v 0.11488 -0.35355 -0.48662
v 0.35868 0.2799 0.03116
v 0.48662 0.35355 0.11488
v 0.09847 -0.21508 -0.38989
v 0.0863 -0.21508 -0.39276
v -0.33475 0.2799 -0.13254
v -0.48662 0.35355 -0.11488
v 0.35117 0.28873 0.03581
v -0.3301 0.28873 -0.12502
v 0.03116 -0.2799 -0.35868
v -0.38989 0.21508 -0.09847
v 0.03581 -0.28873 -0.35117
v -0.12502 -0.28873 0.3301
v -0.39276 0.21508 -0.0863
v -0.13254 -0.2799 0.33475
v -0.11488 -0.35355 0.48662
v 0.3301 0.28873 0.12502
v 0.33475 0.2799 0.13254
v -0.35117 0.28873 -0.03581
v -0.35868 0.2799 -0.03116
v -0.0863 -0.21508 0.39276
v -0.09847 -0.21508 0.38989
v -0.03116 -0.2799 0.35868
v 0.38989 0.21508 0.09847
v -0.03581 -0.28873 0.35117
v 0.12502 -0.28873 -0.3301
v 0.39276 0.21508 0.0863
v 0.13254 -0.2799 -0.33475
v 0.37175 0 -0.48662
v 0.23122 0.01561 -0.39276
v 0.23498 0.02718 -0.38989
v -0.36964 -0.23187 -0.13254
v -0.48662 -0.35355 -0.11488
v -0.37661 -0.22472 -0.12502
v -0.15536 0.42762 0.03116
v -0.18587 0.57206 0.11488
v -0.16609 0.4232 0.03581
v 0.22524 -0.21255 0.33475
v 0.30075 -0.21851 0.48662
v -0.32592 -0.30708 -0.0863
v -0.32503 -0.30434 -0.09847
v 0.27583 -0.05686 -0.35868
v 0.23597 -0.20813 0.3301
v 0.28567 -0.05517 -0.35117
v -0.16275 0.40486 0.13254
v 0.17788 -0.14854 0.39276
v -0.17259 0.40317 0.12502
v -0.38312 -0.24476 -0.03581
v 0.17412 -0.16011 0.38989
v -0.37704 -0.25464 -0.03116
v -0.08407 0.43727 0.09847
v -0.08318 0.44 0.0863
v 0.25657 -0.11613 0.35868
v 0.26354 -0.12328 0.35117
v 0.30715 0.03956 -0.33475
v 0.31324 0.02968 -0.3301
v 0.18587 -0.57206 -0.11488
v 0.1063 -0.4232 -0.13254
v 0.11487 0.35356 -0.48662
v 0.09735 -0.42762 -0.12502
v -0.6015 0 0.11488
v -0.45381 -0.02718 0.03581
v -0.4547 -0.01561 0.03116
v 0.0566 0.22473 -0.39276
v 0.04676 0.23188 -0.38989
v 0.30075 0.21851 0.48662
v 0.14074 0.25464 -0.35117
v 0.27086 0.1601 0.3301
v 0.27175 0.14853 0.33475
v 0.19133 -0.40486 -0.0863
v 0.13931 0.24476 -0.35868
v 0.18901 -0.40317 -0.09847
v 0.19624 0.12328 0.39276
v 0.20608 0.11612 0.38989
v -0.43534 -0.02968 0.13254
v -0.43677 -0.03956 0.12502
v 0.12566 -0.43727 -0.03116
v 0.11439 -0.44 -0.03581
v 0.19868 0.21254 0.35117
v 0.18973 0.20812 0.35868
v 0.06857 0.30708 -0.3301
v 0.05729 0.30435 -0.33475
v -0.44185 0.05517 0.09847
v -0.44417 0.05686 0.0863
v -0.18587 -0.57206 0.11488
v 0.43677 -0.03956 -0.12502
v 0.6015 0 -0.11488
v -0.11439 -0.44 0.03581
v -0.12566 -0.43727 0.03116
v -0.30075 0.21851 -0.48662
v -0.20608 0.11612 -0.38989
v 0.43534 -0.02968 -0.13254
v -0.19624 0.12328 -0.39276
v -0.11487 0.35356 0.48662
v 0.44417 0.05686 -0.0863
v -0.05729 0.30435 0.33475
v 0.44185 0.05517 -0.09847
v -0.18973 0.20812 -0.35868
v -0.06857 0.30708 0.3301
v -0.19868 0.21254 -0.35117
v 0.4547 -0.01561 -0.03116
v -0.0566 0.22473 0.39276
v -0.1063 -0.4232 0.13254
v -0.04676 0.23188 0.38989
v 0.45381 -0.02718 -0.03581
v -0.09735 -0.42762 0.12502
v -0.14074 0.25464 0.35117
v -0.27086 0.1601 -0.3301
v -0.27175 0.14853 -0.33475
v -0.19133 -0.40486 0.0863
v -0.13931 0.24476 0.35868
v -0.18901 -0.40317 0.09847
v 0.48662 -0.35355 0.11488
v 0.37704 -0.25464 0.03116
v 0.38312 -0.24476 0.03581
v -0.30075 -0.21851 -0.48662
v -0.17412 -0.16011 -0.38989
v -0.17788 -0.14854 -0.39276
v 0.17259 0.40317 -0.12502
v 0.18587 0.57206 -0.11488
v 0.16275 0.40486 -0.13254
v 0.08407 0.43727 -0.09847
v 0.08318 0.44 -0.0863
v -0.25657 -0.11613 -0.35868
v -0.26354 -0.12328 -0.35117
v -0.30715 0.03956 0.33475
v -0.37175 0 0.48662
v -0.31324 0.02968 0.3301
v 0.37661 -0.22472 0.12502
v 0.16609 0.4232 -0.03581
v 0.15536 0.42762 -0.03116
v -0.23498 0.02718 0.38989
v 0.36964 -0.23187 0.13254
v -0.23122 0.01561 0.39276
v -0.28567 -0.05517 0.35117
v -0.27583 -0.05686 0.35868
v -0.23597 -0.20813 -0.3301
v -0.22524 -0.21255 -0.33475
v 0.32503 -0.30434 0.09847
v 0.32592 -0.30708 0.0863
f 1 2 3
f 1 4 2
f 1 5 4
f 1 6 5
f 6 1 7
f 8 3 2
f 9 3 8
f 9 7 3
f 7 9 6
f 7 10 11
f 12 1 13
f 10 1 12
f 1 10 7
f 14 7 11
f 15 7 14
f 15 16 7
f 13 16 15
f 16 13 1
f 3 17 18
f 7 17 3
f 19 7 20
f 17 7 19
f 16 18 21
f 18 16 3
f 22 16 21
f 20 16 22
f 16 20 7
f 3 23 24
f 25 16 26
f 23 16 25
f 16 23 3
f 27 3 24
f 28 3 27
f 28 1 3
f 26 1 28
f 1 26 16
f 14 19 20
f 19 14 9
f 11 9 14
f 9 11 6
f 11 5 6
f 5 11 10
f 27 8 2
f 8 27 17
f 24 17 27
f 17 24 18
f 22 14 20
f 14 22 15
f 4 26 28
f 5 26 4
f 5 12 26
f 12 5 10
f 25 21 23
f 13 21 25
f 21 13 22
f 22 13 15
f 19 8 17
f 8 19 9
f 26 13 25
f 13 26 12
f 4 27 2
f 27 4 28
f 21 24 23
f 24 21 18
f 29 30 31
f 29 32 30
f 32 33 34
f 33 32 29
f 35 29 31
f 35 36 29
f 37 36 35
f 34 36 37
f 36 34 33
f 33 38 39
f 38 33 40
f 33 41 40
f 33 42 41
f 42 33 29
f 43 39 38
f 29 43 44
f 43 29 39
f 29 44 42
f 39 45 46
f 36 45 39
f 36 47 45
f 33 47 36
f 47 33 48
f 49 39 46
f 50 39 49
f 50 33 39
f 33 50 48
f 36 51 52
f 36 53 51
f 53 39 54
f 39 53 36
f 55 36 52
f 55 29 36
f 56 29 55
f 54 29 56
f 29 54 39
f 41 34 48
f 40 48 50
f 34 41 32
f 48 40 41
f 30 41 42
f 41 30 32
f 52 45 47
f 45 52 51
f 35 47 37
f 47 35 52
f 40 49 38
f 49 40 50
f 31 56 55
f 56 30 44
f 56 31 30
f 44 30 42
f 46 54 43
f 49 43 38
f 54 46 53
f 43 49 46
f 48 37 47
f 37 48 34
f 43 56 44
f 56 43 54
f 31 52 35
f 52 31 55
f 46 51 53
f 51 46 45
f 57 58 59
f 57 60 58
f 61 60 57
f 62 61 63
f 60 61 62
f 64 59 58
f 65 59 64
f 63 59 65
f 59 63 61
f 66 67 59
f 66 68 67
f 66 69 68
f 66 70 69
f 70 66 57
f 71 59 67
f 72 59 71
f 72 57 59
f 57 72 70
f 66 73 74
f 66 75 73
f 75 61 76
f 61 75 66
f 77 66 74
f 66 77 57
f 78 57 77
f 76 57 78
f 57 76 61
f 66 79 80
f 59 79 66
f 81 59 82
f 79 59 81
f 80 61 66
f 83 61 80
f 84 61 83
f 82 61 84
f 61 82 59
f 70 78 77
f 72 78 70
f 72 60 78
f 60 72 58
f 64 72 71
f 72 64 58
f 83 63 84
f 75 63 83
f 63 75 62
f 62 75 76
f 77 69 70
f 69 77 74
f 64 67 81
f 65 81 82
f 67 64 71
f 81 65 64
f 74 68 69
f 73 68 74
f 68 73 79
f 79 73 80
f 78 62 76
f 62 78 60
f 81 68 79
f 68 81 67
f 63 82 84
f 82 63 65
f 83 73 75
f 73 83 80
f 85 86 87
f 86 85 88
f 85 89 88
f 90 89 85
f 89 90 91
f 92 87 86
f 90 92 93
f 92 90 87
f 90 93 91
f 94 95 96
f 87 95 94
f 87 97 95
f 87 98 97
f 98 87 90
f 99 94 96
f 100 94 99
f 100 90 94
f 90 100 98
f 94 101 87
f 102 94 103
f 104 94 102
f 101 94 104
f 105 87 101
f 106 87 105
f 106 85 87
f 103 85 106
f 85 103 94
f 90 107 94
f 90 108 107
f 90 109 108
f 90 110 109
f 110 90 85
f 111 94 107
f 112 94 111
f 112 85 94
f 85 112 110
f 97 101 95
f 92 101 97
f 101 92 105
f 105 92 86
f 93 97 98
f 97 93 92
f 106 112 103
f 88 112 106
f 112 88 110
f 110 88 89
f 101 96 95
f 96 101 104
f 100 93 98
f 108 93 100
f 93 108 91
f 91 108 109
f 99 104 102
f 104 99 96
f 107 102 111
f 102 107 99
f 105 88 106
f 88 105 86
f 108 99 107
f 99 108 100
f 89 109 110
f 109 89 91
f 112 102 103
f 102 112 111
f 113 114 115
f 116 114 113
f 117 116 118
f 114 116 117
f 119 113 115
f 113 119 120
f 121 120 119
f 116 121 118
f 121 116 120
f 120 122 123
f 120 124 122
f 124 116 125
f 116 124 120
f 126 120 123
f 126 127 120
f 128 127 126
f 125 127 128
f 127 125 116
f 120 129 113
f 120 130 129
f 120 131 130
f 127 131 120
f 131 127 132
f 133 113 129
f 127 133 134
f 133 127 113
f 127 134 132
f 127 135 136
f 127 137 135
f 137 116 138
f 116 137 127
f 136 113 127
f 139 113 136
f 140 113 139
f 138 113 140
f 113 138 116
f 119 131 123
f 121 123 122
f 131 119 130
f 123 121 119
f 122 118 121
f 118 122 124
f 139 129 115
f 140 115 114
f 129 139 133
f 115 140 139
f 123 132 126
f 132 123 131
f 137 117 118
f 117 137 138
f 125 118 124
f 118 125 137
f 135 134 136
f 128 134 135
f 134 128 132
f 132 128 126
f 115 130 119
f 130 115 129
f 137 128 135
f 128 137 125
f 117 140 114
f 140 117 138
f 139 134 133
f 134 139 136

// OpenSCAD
/*
    fit.scad
    FIT: Five Intersecting Tetrahedra
    Copyright © 2025 Forrest O. Interactive
    Licensed under CC BY 4.0 https://creativecommons.org/licenses/by/4.0/
*/

module hollow_poly(shape_vertices, shape_faces, face_shrink=0.8, hole_grow = 1.05) {
    // Function to find center of a face
    function face_center(vertices, face) = 
        let(
            points = [for(i = face) vertices[i]],
            x = [for(p = points) p[0]],
            y = [for(p = points) p[1]],
            z = [for(p = points) p[2]]
        )
        [(x[0] + x[1] + x[2])/len(face), 
         (y[0] + y[1] + y[2])/len(face), 
         (z[0] + z[1] + z[2])/len(face)];
    
    // Function to shrink a face towards its center
    function shrink_face(vertices, face, shrink_factor) = 
        let(
            center = face_center(vertices, face)
        )
        [for(idx = face)
            let(
                point = vertices[idx],
                vector = point - center
            )
            center + vector * shrink_factor
        ];
    
    // Collect all shrunk faces into a single vertex list
    shrunk_vertices = [
        for(face = shape_faces)
        let(shrunk = shrink_face(shape_vertices, face, face_shrink))
        for(v = shrunk) v
    ];
        
    difference () {
        // polyhedron by itself isn't "water-tight" for difference o_O
        hull() {
            polyhedron(points=shape_vertices, faces=shape_faces);
        }
        
        scale(hole_grow)
        hull() {
            polyhedron(
                points=shrunk_vertices,
                faces=[
                    for(i=[0:len(shrunk_vertices)/3-1])
                    [i*3, i*3+1, i*3+2]
                ]
            );
        }
    }
}

// Tetrahedron basic def via https://github.com/benjamin-edward-morgan/openscad-polyhedra
tetrahedron_vertices = [[1,1,1],[1,-1,-1],[-1,1,-1],[-1,-1,1]]/sqrt(8);
tetrahedron_faces = [[0,1,2],[0,2,3],[0,3,1],[1,3,2]];

colors = ["Red", "Blue", "Green", "Yellow", "Purple"];

// The arcsin(1/3) angle properly aligns the tetrahedron with respect to icosahedral symmetry
initial_rot = [0, 31.717, 0]; // arcsin(1/3) ≈ 31.717°

for(i = [0:4]) {
    color(colors[i])
    rotate([0, 0, i * 360/5])
    rotate(initial_rot)
    hollow_poly(tetrahedron_vertices, tetrahedron_faces, face_shrink=2/3);
}
